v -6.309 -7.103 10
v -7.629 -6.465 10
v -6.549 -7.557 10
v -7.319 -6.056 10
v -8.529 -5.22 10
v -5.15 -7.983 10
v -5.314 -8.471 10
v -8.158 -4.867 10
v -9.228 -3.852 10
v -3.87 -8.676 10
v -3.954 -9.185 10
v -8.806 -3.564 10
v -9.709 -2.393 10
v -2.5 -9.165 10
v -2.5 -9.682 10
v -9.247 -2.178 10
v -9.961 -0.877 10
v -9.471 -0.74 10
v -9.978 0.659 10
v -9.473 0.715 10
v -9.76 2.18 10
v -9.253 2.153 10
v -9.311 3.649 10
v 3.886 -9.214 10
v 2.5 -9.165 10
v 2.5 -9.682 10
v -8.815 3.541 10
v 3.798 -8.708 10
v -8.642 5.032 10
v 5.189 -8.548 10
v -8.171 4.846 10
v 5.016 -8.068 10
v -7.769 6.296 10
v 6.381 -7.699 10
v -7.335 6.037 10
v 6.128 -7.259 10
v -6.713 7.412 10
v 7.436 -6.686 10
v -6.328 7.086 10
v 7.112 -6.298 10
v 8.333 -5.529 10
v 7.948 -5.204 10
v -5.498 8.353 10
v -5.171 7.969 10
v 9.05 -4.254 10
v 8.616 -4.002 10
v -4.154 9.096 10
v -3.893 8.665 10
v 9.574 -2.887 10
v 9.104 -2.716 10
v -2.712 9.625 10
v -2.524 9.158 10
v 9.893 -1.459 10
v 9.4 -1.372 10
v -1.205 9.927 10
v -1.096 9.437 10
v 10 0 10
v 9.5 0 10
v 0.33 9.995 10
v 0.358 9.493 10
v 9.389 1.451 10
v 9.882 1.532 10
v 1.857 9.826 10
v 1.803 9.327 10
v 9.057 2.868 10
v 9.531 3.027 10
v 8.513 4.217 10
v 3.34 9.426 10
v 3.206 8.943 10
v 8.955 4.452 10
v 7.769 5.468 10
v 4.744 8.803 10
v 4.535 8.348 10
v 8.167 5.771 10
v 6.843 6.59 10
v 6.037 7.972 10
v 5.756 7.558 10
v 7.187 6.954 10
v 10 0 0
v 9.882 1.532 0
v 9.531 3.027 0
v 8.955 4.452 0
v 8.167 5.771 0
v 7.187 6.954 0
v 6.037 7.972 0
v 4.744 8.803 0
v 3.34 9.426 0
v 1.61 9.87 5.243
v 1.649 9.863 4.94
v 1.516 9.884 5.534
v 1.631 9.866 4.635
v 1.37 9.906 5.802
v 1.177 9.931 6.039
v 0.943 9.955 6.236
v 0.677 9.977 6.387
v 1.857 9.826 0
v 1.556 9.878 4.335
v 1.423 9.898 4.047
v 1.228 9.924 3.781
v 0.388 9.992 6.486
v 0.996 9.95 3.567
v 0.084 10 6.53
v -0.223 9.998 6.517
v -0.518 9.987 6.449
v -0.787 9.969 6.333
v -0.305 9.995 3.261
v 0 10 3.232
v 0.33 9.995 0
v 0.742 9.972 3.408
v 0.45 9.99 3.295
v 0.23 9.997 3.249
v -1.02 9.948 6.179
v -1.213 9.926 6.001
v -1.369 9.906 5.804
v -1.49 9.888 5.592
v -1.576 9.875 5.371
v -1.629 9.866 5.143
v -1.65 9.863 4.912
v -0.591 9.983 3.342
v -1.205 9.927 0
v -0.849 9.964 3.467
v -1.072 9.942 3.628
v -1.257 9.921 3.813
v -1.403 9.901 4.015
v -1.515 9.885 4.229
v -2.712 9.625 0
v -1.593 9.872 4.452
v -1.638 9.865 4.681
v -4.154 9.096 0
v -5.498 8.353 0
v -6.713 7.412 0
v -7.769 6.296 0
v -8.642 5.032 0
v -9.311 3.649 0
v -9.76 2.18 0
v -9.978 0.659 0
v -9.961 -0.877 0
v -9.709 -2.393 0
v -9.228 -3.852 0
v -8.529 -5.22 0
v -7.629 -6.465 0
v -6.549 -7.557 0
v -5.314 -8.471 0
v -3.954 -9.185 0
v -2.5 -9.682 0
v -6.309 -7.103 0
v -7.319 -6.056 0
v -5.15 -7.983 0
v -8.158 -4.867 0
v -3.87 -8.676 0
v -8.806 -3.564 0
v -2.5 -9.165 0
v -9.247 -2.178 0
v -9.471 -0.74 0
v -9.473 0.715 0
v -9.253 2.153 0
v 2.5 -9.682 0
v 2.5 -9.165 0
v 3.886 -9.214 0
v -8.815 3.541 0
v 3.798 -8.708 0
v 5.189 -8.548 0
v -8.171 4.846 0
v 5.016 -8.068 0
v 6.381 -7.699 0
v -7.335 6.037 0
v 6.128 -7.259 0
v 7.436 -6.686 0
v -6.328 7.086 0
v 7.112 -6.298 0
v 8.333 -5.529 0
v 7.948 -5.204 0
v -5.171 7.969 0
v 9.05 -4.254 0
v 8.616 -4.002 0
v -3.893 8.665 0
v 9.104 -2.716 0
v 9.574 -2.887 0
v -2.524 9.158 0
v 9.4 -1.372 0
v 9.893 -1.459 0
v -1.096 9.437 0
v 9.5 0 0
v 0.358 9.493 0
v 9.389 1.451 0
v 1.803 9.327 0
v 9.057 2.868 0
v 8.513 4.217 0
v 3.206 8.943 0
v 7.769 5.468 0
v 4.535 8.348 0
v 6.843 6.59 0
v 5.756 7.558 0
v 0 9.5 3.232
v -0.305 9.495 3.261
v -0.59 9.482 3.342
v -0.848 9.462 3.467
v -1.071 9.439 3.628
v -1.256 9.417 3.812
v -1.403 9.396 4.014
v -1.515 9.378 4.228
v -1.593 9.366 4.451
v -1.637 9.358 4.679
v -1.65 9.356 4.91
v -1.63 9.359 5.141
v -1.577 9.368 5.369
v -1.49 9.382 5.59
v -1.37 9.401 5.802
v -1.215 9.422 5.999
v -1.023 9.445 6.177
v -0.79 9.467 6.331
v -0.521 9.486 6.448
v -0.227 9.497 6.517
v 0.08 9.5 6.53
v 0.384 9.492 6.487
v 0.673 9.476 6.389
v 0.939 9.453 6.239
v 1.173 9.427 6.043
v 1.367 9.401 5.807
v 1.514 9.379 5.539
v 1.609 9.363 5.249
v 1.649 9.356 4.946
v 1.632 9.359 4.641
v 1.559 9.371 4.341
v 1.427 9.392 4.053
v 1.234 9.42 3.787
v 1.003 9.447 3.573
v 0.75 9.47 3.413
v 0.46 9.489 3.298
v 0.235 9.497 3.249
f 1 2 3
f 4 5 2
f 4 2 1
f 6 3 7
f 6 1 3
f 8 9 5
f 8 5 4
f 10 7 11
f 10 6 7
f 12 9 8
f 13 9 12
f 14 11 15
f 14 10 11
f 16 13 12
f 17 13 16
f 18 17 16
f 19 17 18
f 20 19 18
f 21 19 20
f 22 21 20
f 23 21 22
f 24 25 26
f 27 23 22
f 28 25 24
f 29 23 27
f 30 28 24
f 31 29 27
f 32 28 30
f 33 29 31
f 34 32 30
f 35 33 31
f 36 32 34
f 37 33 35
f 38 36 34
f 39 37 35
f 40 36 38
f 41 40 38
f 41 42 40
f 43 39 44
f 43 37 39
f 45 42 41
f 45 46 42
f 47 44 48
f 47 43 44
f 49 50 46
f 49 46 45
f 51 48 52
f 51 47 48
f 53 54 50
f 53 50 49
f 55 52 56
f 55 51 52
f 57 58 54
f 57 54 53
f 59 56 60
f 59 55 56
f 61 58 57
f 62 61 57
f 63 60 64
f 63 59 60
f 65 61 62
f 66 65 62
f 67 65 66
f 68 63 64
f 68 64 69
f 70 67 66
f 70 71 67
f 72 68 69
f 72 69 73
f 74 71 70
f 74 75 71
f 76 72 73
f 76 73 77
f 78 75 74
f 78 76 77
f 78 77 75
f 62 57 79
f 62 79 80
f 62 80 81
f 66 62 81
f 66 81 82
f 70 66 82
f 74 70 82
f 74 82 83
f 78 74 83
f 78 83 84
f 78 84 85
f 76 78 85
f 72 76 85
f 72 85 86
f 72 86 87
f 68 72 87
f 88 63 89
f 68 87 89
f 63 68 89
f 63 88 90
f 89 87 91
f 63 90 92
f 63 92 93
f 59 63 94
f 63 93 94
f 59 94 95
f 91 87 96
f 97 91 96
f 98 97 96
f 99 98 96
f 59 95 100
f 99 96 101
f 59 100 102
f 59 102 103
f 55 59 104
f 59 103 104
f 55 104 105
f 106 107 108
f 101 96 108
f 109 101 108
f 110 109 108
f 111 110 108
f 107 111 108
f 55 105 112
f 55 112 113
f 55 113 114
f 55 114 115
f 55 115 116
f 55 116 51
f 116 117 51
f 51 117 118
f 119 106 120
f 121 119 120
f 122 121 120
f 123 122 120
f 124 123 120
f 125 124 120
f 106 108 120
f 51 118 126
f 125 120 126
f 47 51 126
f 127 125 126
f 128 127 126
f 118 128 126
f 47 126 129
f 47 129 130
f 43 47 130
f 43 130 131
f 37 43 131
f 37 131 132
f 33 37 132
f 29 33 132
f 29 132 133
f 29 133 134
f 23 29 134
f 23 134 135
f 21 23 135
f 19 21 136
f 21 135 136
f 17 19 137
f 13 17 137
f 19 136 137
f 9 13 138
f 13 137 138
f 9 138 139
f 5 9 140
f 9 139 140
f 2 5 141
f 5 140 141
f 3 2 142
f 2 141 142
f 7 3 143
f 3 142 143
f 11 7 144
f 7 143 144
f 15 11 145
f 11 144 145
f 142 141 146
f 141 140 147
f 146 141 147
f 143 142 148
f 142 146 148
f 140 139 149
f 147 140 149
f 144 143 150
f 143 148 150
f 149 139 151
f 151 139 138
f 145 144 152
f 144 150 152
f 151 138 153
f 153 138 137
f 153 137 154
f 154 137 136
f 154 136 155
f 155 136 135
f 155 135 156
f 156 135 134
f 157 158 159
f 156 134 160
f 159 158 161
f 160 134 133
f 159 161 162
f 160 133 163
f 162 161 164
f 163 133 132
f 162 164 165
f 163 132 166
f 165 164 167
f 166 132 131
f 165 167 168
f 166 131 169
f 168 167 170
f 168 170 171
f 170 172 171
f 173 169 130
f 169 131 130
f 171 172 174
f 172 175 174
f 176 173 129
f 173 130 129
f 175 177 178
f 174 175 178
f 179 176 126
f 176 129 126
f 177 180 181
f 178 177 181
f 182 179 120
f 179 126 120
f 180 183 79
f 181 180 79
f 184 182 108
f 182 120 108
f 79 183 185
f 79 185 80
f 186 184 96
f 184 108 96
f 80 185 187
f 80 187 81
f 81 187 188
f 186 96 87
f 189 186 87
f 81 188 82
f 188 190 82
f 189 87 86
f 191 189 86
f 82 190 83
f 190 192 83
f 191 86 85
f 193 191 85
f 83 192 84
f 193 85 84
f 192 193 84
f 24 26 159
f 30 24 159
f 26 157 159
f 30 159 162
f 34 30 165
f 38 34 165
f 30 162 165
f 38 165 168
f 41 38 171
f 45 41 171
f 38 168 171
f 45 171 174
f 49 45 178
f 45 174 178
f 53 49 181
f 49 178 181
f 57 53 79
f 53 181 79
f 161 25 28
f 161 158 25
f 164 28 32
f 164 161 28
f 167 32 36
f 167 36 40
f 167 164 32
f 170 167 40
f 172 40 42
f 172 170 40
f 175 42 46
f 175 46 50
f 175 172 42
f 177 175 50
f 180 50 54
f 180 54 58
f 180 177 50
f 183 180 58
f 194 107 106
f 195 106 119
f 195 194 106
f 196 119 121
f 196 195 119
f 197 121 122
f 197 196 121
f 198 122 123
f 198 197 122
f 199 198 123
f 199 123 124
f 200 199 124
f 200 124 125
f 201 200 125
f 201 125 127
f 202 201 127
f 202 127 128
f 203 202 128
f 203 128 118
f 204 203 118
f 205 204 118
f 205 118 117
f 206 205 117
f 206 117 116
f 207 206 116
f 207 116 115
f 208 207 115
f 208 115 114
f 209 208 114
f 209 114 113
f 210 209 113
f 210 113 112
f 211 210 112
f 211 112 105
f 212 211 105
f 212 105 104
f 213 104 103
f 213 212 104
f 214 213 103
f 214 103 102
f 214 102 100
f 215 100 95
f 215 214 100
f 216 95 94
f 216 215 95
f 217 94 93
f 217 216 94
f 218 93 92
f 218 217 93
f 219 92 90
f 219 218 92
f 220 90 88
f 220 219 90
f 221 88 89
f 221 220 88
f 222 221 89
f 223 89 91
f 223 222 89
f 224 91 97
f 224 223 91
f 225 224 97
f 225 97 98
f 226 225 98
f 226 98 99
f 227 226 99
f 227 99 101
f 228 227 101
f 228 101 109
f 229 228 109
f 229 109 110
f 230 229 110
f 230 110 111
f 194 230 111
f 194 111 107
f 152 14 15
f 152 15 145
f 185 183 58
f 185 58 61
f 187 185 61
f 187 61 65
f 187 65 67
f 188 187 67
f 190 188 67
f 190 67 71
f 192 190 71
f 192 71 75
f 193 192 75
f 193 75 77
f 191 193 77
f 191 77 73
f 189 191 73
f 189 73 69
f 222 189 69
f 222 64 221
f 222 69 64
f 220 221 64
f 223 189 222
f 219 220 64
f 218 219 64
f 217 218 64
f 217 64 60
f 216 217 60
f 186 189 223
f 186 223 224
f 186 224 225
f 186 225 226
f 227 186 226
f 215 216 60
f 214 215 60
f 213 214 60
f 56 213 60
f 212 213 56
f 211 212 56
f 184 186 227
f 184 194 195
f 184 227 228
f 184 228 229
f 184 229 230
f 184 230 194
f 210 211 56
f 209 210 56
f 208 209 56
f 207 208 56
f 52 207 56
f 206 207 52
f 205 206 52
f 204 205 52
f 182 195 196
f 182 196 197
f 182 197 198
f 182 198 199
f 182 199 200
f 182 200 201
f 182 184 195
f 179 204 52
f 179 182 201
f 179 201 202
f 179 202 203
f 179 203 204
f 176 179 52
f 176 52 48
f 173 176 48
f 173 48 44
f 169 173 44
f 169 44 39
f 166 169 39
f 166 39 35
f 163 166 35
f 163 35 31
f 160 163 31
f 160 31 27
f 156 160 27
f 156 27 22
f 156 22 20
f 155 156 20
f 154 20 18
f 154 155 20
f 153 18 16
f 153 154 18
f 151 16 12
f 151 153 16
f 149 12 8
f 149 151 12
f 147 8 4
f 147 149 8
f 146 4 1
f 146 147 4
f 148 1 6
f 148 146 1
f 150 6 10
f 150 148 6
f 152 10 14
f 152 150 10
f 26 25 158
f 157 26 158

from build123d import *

# Parameters (mm, degrees)
SKETCH_1_R          = 10
SKETCH_1_R_2        = 9.5
EXTRUDE_1_DEPTH     = 10
SKETCH_2_R          = 1.65
CUT_EXTRUDE_1_DEPTH = 18.320508076
SKETCH_3_W          = 5
SKETCH_3_H          = 20.666812771
CUT_EXTRUDE_2_DEPTH = 18.320508249


with BuildPart() as part:
    # 草图1 → 凸台-拉伸1 (new body)
    with BuildSketch(Plane.XY):
        Circle(SKETCH_1_R)
        Circle(SKETCH_1_R_2, mode=Mode.SUBTRACT)
    extrude(amount=EXTRUDE_1_DEPTH)

    # 草图2 → 切除-拉伸1 (cut, through all)
    with BuildSketch(Plane(origin=(0, 0, 0), x_dir=(1, 0, 0), z_dir=(0, 1, 0))):
        with Locations(Location((0, -4.882407133, 0), (0, 0, 90))):
            Circle(SKETCH_2_R)
    extrude(amount=CUT_EXTRUDE_1_DEPTH, mode=Mode.SUBTRACT)

    # 草图3 → 切除-拉伸2 (cut, through all)
    with BuildSketch(Plane(origin=(0, 0, 0), x_dir=(1, 0, 0), z_dir=(0, 1, 0))):
        with Locations((0, -4.882407133)):
            Rectangle(SKETCH_3_W, SKETCH_3_H)
    extrude(amount=-CUT_EXTRUDE_2_DEPTH, mode=Mode.SUBTRACT)


solid = part.part
